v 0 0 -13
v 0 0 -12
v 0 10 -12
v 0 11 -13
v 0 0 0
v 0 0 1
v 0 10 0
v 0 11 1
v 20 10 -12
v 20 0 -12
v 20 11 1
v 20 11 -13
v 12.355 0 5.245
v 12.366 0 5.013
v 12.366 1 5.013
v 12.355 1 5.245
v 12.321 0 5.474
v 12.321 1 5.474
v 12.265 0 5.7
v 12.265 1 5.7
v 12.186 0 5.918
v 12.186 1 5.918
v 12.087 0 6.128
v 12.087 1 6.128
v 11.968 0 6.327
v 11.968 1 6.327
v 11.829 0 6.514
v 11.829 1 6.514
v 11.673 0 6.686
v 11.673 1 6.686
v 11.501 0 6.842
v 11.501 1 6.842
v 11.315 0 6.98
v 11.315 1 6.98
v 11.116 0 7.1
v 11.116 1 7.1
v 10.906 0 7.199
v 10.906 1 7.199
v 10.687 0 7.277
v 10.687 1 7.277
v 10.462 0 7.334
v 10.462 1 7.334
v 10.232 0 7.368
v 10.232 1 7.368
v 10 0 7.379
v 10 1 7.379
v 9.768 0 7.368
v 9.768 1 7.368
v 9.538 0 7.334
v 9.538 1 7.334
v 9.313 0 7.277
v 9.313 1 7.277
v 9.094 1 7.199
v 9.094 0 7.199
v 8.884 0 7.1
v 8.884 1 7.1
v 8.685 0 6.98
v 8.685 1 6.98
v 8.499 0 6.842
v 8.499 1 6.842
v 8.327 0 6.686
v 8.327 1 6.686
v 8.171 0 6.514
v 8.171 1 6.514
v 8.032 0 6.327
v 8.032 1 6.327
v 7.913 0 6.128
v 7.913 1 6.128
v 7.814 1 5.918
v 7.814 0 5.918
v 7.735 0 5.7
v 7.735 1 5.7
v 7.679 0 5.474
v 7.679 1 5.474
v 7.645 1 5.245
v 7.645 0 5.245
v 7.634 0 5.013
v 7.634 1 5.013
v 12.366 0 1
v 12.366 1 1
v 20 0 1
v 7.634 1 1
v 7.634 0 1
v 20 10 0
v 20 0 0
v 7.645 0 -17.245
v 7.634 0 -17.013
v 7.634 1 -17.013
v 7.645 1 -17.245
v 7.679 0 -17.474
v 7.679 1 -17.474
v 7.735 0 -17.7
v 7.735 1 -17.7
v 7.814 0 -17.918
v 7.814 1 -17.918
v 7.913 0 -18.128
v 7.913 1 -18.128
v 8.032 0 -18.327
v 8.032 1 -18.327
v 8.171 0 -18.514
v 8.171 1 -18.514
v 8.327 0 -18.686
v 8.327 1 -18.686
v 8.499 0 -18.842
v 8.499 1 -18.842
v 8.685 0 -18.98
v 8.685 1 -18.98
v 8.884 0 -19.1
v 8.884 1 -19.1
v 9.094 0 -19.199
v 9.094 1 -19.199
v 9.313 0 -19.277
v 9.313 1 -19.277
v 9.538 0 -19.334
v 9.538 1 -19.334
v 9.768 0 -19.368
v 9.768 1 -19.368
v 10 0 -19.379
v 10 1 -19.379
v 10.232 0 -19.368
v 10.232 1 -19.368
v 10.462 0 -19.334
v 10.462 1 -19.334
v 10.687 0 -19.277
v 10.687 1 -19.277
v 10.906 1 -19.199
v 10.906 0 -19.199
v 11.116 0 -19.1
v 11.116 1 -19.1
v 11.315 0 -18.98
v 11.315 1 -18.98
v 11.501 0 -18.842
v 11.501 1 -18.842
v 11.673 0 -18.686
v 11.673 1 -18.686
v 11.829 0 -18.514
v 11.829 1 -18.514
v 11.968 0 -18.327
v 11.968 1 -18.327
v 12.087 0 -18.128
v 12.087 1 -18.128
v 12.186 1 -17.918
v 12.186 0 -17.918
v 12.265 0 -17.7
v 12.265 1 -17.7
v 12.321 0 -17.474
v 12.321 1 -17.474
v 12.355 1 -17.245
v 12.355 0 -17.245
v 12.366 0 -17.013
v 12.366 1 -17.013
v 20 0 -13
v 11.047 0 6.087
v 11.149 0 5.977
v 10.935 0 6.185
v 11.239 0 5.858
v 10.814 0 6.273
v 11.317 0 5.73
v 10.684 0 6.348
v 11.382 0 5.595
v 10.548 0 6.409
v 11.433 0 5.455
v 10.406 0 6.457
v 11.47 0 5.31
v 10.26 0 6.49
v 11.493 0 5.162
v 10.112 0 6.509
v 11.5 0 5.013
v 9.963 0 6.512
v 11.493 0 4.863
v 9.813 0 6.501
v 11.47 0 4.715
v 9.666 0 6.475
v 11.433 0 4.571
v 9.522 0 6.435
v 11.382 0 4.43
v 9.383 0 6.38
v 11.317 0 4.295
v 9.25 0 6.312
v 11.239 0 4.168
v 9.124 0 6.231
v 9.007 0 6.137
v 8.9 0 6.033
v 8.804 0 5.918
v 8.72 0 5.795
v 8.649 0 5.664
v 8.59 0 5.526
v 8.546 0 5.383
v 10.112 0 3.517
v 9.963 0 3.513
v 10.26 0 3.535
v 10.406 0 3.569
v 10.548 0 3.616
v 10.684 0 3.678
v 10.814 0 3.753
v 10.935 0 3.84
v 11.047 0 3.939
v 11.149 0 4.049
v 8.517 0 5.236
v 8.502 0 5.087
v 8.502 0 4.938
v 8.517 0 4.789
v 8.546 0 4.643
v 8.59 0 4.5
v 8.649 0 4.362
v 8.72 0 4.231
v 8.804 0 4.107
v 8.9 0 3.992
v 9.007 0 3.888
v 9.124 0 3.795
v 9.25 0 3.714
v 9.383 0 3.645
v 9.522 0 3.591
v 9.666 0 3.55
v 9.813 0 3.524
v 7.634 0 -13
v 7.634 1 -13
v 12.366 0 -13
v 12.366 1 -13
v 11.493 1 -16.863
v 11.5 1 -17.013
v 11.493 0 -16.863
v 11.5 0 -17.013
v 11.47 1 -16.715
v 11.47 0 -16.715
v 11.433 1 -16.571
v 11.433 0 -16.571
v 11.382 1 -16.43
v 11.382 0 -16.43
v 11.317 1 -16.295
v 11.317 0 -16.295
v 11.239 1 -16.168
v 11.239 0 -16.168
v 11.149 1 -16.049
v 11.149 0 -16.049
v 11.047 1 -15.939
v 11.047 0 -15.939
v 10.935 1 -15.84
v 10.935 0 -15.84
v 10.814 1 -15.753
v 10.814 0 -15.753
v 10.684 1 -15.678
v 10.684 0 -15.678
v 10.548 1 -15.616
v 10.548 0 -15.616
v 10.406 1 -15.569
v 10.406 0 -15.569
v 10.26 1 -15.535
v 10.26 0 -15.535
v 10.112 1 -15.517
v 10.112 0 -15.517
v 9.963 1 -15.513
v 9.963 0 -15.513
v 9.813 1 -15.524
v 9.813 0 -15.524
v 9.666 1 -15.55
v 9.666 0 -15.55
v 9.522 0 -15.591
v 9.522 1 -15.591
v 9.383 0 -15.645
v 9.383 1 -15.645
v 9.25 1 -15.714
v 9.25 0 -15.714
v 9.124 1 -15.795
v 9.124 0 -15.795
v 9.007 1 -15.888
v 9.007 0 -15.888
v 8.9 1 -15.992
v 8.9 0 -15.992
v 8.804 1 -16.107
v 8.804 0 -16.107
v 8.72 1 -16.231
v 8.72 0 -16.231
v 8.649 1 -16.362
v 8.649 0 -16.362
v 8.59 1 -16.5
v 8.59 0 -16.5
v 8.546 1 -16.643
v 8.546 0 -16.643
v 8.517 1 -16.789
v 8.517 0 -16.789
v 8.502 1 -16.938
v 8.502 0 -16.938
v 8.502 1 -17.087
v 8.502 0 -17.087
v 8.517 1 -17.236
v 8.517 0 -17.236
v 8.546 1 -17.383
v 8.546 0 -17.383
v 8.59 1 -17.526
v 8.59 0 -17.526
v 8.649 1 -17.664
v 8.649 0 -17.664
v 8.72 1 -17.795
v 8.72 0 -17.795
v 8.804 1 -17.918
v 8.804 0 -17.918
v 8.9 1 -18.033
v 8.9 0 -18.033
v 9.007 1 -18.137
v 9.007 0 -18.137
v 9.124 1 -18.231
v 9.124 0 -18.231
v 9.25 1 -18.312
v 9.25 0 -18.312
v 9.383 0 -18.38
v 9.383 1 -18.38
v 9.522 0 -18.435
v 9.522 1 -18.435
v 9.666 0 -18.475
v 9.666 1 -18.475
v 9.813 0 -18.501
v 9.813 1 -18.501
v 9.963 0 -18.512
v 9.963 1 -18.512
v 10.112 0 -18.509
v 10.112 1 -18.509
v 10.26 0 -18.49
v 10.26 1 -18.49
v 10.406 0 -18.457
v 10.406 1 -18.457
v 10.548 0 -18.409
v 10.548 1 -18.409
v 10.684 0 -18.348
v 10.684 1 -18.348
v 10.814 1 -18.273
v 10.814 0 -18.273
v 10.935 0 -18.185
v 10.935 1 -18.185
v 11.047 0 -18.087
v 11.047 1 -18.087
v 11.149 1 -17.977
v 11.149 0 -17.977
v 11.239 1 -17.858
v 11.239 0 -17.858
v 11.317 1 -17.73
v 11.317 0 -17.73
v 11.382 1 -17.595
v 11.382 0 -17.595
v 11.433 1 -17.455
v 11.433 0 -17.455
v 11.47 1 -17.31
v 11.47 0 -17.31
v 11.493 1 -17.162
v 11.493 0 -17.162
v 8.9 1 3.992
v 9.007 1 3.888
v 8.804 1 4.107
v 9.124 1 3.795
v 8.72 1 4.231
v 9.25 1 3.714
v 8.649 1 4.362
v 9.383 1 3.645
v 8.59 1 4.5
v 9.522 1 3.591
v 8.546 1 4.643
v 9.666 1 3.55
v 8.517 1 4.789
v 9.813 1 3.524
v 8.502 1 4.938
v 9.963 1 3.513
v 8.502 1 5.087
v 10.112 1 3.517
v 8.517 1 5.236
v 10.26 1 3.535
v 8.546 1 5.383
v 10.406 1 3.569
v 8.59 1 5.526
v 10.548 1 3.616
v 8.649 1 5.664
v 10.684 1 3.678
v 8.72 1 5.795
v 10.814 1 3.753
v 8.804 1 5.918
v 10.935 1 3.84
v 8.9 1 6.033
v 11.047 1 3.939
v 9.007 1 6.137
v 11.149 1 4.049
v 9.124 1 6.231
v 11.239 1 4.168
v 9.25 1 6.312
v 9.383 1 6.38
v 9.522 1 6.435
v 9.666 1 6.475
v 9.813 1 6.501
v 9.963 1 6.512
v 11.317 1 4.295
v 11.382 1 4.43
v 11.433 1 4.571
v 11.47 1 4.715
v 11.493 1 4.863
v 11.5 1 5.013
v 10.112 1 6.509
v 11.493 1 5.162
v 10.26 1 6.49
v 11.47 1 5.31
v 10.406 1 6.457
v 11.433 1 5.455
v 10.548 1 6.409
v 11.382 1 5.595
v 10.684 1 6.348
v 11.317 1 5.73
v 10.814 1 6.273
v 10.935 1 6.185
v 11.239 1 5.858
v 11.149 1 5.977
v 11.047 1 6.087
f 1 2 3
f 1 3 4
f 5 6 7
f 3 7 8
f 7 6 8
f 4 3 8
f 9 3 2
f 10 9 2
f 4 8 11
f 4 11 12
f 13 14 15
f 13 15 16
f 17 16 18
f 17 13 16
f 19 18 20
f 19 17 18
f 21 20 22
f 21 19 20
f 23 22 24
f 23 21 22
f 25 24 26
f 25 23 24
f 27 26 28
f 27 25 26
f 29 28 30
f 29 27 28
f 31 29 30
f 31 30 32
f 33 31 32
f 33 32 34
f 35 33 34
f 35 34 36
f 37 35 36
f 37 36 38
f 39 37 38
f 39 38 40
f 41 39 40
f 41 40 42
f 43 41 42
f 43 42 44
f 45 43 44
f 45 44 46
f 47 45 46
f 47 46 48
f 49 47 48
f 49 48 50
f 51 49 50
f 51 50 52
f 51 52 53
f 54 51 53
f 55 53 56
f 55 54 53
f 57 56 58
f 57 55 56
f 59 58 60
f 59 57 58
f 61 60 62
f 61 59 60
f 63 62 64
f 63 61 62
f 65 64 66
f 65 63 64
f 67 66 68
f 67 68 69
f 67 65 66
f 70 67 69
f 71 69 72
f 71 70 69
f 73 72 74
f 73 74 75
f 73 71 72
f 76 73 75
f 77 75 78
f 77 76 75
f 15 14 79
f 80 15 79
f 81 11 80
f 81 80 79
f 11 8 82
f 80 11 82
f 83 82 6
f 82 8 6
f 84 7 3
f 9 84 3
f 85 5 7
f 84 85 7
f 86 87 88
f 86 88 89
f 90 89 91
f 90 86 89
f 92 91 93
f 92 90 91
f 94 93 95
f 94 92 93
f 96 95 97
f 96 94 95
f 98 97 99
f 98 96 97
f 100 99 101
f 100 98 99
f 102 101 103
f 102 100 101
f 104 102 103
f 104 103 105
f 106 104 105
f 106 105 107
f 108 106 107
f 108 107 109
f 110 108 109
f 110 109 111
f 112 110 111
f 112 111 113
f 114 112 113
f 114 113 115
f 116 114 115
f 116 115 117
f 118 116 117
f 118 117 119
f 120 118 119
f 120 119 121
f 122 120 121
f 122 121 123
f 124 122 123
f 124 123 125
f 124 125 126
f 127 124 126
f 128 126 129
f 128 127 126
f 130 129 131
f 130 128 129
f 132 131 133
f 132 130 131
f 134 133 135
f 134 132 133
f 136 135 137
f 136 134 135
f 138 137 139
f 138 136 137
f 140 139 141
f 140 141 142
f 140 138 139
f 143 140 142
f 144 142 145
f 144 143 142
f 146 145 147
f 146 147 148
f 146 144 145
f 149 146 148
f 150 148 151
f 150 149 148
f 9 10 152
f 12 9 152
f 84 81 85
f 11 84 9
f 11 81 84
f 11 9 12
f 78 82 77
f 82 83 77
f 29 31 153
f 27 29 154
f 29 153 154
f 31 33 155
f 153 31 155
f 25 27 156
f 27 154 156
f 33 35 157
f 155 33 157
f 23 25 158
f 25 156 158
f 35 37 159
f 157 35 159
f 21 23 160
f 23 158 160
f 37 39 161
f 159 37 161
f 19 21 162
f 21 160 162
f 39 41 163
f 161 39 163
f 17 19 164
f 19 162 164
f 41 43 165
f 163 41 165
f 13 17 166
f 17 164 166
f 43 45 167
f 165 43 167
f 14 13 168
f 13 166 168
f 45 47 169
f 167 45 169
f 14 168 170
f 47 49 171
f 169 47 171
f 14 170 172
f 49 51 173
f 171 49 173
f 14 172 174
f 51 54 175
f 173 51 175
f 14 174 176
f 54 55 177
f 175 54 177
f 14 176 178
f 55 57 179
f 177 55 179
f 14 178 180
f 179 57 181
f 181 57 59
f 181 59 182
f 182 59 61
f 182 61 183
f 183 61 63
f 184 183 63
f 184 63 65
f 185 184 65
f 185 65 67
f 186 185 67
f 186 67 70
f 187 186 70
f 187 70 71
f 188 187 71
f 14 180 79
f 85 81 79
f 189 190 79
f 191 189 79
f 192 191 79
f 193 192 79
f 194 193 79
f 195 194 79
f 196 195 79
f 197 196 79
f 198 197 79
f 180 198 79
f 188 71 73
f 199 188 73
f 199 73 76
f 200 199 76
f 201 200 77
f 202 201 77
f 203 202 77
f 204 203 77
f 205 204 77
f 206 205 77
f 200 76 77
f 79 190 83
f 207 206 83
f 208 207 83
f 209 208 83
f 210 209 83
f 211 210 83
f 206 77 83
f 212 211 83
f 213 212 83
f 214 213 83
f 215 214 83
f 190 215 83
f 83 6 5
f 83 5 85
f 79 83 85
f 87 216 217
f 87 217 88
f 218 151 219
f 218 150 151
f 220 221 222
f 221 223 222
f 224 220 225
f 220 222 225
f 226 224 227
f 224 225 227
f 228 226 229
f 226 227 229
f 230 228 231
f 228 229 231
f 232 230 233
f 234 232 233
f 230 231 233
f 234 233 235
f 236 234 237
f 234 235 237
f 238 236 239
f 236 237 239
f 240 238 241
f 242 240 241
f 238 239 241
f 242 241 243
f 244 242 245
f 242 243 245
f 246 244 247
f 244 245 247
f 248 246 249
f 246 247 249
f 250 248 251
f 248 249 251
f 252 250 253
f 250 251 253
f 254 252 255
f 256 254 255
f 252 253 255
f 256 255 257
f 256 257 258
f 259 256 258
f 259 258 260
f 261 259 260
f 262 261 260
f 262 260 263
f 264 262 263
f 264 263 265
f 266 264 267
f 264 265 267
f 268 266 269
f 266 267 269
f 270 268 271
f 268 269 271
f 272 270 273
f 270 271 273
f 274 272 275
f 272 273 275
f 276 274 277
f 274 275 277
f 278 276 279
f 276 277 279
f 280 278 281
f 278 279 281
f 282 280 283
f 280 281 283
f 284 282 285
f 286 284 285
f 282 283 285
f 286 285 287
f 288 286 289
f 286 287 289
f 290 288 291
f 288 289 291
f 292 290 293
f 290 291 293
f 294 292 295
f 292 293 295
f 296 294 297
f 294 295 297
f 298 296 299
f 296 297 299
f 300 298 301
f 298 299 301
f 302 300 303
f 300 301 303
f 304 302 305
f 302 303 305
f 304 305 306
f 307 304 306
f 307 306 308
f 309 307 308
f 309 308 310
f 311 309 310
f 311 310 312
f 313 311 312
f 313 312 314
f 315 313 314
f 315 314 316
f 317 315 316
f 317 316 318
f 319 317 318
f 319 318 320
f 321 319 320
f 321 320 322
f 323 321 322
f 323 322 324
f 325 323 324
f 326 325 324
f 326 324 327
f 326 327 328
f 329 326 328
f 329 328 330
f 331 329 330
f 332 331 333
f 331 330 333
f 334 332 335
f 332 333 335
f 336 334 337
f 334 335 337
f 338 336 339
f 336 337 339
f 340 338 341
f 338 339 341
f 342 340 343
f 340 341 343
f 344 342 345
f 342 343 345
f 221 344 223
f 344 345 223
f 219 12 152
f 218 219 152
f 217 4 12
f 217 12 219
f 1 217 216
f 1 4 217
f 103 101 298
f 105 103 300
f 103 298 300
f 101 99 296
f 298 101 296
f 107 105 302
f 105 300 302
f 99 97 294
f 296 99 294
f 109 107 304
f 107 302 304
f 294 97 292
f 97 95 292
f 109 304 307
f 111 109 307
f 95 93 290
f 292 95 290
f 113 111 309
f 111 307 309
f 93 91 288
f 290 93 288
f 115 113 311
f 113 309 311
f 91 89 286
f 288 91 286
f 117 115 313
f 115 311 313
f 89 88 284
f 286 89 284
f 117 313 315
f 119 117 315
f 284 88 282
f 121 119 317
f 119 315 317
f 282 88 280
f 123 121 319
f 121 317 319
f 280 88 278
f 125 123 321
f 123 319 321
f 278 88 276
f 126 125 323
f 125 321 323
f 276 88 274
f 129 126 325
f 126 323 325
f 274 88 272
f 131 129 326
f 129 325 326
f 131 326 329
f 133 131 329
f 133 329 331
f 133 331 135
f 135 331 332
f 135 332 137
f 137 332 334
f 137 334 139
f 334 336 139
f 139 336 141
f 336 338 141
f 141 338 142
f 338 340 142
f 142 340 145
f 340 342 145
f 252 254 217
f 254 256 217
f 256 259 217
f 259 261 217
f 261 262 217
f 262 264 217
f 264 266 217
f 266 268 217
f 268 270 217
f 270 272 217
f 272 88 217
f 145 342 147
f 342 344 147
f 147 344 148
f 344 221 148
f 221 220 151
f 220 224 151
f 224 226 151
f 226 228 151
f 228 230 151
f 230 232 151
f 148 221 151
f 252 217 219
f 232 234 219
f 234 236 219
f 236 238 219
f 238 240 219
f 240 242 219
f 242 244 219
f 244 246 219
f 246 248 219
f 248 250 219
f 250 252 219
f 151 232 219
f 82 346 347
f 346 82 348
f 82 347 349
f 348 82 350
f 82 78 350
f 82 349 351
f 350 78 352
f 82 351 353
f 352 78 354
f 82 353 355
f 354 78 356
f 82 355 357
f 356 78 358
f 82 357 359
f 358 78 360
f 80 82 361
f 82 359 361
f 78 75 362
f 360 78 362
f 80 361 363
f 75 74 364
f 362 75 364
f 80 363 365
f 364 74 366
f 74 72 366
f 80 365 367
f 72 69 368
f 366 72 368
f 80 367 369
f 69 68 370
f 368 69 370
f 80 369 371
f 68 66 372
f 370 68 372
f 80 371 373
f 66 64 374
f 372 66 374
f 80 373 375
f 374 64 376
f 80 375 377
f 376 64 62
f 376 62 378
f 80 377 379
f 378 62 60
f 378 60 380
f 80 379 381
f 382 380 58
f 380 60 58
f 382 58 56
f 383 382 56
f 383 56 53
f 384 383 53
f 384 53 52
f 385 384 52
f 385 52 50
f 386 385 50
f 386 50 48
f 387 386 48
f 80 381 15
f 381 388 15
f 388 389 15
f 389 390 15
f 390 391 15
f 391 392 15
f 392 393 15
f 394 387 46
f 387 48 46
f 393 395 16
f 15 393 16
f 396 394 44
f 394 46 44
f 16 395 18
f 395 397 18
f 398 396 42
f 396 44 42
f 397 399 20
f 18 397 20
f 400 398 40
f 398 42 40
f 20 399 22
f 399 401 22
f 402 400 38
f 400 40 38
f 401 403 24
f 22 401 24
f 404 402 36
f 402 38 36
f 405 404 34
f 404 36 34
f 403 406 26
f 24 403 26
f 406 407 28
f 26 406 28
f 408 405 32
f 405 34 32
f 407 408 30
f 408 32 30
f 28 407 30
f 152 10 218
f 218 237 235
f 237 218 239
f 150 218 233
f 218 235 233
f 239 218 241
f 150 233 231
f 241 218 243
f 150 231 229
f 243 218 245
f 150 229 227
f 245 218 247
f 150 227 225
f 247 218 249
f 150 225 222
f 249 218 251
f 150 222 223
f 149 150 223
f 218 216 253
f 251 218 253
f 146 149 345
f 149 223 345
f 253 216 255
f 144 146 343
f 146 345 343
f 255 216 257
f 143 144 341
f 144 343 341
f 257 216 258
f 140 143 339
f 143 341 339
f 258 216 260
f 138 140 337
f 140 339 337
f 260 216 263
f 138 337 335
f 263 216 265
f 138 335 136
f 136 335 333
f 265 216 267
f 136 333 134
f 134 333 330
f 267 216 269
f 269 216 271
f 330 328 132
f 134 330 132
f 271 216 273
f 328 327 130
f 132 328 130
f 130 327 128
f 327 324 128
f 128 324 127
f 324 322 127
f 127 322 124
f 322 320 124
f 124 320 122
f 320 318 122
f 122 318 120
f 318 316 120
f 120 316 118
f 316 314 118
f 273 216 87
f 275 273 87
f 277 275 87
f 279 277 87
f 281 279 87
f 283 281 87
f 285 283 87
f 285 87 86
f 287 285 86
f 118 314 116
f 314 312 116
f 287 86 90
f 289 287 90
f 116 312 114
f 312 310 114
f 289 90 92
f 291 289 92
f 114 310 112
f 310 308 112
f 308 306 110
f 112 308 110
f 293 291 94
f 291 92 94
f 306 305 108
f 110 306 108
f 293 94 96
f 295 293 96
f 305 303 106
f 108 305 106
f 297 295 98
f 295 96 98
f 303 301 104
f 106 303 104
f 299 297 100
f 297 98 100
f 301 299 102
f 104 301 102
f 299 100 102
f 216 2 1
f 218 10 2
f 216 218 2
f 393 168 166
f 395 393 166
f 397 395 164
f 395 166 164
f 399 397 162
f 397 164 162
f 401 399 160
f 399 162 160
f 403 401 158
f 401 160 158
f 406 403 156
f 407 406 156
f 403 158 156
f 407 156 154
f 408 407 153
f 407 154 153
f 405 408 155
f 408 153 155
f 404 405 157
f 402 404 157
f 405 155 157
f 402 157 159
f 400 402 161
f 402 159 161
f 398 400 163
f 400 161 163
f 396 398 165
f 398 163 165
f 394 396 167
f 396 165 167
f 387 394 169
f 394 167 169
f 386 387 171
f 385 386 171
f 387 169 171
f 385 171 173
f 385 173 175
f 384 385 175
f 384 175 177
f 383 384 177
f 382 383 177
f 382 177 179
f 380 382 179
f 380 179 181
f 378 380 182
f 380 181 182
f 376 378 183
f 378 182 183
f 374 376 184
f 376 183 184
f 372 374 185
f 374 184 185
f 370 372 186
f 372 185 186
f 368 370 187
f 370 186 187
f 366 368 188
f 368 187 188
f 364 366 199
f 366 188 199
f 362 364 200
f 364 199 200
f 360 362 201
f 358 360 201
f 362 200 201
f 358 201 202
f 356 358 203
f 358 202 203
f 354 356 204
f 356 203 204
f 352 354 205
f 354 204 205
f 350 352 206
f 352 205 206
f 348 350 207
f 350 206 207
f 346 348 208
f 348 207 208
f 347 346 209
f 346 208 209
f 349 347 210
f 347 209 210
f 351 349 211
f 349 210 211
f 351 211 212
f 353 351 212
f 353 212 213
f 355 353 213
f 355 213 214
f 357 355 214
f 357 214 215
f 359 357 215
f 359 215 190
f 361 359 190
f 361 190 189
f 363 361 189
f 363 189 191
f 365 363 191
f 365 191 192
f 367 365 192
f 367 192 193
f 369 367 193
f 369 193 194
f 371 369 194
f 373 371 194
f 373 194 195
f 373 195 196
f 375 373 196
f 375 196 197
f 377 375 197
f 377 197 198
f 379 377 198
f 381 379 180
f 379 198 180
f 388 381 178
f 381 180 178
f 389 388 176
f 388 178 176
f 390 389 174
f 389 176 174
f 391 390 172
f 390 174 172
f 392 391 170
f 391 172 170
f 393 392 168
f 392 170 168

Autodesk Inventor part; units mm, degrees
ref_plane "YZ Plane" through (0, 0, 0) normal (1, 0, 0) x (0, 1, 0)
ref_plane "XZ Plane" through (0, 0, 0) normal (0, 1, 0) x (-1, 0, 0)
sketch "Esboço1" plane through (0, 0, 0) normal (1, 0, 0) x (0, 1, 0)
  line L0 (0, 0) -> (10, 0)
  line L1 (10, 1) -> (1, 1)
  line L2 (10, 0) -> (10, -12)
  line L3 (10, -12) -> (1, -12)
  line L4 (10, 1) -> (11, 1)
  line L5 (11, 1) -> (11, -13)
  line L6 (11, -13) -> (1, -13)
  line L7 (0, 1) -> (0, 0)
  line L8 (10, 0) -> (0, 0)
  line L9 (1, -12) -> (0, -12)
  line L10 (0, -12) -> (0, -13)
  line L11 (1, -13) -> (0, -13)
  line L12 (1, 1) -> (0, 1)
extrude "Extrusão1" add sketch "Esboço1" along normal blind 20
ref_plane "Plano de trabalho1" through (0, 0, 0) normal (0, -1, 0) x (1, 0, 0)
sketch "Esboço2" plane through (0, 0, 0) normal (0, -1, 0) x (1, 0, 0)
  line L0 (0, 0) -> (20, 0) projected
  line L1 (20, 0) -> (20, -12) projected
  line L2 (20, -6) -> (22.0296, -6)
  line L3 (0, 1) -> (20, 1) projected
  line L4 (10, 1) -> (10, 5.0127) construction
  line L5 (7.6336, 1) -> (7.6336, 5.0127)
  line L6 (12.3664, 5.0127) -> (12.3664, 1)
  arc A0 (12.3664, 5.0127) -> (7.6336, 5.0127) centre (10, 5.0127) ccw
  circle A1 centre (10, 5.0127) radius 1.5
  line L7 (7.6336, -13) -> (7.6336, -17.0127)
  line L8 (12.3664, -17.0127) -> (12.3664, -13)
  arc A2 (7.6336, -17.0127) -> (12.3664, -17.0127) centre (10, -17.0127) ccw
  circle A3 centre (10, -17.0127) radius 1.5
  line L9 (12.3664, -13) -> (7.6336, -13)
  line L10 (0, -13) -> (20, -13) projected
  line L11 (12.3664, 1) -> (7.6336, 1)
  point P0 (10, 3.0064)
extrude "Extrusão2" add sketch "Esboço2" against normal blind 1
properties part number "engate_motor"
